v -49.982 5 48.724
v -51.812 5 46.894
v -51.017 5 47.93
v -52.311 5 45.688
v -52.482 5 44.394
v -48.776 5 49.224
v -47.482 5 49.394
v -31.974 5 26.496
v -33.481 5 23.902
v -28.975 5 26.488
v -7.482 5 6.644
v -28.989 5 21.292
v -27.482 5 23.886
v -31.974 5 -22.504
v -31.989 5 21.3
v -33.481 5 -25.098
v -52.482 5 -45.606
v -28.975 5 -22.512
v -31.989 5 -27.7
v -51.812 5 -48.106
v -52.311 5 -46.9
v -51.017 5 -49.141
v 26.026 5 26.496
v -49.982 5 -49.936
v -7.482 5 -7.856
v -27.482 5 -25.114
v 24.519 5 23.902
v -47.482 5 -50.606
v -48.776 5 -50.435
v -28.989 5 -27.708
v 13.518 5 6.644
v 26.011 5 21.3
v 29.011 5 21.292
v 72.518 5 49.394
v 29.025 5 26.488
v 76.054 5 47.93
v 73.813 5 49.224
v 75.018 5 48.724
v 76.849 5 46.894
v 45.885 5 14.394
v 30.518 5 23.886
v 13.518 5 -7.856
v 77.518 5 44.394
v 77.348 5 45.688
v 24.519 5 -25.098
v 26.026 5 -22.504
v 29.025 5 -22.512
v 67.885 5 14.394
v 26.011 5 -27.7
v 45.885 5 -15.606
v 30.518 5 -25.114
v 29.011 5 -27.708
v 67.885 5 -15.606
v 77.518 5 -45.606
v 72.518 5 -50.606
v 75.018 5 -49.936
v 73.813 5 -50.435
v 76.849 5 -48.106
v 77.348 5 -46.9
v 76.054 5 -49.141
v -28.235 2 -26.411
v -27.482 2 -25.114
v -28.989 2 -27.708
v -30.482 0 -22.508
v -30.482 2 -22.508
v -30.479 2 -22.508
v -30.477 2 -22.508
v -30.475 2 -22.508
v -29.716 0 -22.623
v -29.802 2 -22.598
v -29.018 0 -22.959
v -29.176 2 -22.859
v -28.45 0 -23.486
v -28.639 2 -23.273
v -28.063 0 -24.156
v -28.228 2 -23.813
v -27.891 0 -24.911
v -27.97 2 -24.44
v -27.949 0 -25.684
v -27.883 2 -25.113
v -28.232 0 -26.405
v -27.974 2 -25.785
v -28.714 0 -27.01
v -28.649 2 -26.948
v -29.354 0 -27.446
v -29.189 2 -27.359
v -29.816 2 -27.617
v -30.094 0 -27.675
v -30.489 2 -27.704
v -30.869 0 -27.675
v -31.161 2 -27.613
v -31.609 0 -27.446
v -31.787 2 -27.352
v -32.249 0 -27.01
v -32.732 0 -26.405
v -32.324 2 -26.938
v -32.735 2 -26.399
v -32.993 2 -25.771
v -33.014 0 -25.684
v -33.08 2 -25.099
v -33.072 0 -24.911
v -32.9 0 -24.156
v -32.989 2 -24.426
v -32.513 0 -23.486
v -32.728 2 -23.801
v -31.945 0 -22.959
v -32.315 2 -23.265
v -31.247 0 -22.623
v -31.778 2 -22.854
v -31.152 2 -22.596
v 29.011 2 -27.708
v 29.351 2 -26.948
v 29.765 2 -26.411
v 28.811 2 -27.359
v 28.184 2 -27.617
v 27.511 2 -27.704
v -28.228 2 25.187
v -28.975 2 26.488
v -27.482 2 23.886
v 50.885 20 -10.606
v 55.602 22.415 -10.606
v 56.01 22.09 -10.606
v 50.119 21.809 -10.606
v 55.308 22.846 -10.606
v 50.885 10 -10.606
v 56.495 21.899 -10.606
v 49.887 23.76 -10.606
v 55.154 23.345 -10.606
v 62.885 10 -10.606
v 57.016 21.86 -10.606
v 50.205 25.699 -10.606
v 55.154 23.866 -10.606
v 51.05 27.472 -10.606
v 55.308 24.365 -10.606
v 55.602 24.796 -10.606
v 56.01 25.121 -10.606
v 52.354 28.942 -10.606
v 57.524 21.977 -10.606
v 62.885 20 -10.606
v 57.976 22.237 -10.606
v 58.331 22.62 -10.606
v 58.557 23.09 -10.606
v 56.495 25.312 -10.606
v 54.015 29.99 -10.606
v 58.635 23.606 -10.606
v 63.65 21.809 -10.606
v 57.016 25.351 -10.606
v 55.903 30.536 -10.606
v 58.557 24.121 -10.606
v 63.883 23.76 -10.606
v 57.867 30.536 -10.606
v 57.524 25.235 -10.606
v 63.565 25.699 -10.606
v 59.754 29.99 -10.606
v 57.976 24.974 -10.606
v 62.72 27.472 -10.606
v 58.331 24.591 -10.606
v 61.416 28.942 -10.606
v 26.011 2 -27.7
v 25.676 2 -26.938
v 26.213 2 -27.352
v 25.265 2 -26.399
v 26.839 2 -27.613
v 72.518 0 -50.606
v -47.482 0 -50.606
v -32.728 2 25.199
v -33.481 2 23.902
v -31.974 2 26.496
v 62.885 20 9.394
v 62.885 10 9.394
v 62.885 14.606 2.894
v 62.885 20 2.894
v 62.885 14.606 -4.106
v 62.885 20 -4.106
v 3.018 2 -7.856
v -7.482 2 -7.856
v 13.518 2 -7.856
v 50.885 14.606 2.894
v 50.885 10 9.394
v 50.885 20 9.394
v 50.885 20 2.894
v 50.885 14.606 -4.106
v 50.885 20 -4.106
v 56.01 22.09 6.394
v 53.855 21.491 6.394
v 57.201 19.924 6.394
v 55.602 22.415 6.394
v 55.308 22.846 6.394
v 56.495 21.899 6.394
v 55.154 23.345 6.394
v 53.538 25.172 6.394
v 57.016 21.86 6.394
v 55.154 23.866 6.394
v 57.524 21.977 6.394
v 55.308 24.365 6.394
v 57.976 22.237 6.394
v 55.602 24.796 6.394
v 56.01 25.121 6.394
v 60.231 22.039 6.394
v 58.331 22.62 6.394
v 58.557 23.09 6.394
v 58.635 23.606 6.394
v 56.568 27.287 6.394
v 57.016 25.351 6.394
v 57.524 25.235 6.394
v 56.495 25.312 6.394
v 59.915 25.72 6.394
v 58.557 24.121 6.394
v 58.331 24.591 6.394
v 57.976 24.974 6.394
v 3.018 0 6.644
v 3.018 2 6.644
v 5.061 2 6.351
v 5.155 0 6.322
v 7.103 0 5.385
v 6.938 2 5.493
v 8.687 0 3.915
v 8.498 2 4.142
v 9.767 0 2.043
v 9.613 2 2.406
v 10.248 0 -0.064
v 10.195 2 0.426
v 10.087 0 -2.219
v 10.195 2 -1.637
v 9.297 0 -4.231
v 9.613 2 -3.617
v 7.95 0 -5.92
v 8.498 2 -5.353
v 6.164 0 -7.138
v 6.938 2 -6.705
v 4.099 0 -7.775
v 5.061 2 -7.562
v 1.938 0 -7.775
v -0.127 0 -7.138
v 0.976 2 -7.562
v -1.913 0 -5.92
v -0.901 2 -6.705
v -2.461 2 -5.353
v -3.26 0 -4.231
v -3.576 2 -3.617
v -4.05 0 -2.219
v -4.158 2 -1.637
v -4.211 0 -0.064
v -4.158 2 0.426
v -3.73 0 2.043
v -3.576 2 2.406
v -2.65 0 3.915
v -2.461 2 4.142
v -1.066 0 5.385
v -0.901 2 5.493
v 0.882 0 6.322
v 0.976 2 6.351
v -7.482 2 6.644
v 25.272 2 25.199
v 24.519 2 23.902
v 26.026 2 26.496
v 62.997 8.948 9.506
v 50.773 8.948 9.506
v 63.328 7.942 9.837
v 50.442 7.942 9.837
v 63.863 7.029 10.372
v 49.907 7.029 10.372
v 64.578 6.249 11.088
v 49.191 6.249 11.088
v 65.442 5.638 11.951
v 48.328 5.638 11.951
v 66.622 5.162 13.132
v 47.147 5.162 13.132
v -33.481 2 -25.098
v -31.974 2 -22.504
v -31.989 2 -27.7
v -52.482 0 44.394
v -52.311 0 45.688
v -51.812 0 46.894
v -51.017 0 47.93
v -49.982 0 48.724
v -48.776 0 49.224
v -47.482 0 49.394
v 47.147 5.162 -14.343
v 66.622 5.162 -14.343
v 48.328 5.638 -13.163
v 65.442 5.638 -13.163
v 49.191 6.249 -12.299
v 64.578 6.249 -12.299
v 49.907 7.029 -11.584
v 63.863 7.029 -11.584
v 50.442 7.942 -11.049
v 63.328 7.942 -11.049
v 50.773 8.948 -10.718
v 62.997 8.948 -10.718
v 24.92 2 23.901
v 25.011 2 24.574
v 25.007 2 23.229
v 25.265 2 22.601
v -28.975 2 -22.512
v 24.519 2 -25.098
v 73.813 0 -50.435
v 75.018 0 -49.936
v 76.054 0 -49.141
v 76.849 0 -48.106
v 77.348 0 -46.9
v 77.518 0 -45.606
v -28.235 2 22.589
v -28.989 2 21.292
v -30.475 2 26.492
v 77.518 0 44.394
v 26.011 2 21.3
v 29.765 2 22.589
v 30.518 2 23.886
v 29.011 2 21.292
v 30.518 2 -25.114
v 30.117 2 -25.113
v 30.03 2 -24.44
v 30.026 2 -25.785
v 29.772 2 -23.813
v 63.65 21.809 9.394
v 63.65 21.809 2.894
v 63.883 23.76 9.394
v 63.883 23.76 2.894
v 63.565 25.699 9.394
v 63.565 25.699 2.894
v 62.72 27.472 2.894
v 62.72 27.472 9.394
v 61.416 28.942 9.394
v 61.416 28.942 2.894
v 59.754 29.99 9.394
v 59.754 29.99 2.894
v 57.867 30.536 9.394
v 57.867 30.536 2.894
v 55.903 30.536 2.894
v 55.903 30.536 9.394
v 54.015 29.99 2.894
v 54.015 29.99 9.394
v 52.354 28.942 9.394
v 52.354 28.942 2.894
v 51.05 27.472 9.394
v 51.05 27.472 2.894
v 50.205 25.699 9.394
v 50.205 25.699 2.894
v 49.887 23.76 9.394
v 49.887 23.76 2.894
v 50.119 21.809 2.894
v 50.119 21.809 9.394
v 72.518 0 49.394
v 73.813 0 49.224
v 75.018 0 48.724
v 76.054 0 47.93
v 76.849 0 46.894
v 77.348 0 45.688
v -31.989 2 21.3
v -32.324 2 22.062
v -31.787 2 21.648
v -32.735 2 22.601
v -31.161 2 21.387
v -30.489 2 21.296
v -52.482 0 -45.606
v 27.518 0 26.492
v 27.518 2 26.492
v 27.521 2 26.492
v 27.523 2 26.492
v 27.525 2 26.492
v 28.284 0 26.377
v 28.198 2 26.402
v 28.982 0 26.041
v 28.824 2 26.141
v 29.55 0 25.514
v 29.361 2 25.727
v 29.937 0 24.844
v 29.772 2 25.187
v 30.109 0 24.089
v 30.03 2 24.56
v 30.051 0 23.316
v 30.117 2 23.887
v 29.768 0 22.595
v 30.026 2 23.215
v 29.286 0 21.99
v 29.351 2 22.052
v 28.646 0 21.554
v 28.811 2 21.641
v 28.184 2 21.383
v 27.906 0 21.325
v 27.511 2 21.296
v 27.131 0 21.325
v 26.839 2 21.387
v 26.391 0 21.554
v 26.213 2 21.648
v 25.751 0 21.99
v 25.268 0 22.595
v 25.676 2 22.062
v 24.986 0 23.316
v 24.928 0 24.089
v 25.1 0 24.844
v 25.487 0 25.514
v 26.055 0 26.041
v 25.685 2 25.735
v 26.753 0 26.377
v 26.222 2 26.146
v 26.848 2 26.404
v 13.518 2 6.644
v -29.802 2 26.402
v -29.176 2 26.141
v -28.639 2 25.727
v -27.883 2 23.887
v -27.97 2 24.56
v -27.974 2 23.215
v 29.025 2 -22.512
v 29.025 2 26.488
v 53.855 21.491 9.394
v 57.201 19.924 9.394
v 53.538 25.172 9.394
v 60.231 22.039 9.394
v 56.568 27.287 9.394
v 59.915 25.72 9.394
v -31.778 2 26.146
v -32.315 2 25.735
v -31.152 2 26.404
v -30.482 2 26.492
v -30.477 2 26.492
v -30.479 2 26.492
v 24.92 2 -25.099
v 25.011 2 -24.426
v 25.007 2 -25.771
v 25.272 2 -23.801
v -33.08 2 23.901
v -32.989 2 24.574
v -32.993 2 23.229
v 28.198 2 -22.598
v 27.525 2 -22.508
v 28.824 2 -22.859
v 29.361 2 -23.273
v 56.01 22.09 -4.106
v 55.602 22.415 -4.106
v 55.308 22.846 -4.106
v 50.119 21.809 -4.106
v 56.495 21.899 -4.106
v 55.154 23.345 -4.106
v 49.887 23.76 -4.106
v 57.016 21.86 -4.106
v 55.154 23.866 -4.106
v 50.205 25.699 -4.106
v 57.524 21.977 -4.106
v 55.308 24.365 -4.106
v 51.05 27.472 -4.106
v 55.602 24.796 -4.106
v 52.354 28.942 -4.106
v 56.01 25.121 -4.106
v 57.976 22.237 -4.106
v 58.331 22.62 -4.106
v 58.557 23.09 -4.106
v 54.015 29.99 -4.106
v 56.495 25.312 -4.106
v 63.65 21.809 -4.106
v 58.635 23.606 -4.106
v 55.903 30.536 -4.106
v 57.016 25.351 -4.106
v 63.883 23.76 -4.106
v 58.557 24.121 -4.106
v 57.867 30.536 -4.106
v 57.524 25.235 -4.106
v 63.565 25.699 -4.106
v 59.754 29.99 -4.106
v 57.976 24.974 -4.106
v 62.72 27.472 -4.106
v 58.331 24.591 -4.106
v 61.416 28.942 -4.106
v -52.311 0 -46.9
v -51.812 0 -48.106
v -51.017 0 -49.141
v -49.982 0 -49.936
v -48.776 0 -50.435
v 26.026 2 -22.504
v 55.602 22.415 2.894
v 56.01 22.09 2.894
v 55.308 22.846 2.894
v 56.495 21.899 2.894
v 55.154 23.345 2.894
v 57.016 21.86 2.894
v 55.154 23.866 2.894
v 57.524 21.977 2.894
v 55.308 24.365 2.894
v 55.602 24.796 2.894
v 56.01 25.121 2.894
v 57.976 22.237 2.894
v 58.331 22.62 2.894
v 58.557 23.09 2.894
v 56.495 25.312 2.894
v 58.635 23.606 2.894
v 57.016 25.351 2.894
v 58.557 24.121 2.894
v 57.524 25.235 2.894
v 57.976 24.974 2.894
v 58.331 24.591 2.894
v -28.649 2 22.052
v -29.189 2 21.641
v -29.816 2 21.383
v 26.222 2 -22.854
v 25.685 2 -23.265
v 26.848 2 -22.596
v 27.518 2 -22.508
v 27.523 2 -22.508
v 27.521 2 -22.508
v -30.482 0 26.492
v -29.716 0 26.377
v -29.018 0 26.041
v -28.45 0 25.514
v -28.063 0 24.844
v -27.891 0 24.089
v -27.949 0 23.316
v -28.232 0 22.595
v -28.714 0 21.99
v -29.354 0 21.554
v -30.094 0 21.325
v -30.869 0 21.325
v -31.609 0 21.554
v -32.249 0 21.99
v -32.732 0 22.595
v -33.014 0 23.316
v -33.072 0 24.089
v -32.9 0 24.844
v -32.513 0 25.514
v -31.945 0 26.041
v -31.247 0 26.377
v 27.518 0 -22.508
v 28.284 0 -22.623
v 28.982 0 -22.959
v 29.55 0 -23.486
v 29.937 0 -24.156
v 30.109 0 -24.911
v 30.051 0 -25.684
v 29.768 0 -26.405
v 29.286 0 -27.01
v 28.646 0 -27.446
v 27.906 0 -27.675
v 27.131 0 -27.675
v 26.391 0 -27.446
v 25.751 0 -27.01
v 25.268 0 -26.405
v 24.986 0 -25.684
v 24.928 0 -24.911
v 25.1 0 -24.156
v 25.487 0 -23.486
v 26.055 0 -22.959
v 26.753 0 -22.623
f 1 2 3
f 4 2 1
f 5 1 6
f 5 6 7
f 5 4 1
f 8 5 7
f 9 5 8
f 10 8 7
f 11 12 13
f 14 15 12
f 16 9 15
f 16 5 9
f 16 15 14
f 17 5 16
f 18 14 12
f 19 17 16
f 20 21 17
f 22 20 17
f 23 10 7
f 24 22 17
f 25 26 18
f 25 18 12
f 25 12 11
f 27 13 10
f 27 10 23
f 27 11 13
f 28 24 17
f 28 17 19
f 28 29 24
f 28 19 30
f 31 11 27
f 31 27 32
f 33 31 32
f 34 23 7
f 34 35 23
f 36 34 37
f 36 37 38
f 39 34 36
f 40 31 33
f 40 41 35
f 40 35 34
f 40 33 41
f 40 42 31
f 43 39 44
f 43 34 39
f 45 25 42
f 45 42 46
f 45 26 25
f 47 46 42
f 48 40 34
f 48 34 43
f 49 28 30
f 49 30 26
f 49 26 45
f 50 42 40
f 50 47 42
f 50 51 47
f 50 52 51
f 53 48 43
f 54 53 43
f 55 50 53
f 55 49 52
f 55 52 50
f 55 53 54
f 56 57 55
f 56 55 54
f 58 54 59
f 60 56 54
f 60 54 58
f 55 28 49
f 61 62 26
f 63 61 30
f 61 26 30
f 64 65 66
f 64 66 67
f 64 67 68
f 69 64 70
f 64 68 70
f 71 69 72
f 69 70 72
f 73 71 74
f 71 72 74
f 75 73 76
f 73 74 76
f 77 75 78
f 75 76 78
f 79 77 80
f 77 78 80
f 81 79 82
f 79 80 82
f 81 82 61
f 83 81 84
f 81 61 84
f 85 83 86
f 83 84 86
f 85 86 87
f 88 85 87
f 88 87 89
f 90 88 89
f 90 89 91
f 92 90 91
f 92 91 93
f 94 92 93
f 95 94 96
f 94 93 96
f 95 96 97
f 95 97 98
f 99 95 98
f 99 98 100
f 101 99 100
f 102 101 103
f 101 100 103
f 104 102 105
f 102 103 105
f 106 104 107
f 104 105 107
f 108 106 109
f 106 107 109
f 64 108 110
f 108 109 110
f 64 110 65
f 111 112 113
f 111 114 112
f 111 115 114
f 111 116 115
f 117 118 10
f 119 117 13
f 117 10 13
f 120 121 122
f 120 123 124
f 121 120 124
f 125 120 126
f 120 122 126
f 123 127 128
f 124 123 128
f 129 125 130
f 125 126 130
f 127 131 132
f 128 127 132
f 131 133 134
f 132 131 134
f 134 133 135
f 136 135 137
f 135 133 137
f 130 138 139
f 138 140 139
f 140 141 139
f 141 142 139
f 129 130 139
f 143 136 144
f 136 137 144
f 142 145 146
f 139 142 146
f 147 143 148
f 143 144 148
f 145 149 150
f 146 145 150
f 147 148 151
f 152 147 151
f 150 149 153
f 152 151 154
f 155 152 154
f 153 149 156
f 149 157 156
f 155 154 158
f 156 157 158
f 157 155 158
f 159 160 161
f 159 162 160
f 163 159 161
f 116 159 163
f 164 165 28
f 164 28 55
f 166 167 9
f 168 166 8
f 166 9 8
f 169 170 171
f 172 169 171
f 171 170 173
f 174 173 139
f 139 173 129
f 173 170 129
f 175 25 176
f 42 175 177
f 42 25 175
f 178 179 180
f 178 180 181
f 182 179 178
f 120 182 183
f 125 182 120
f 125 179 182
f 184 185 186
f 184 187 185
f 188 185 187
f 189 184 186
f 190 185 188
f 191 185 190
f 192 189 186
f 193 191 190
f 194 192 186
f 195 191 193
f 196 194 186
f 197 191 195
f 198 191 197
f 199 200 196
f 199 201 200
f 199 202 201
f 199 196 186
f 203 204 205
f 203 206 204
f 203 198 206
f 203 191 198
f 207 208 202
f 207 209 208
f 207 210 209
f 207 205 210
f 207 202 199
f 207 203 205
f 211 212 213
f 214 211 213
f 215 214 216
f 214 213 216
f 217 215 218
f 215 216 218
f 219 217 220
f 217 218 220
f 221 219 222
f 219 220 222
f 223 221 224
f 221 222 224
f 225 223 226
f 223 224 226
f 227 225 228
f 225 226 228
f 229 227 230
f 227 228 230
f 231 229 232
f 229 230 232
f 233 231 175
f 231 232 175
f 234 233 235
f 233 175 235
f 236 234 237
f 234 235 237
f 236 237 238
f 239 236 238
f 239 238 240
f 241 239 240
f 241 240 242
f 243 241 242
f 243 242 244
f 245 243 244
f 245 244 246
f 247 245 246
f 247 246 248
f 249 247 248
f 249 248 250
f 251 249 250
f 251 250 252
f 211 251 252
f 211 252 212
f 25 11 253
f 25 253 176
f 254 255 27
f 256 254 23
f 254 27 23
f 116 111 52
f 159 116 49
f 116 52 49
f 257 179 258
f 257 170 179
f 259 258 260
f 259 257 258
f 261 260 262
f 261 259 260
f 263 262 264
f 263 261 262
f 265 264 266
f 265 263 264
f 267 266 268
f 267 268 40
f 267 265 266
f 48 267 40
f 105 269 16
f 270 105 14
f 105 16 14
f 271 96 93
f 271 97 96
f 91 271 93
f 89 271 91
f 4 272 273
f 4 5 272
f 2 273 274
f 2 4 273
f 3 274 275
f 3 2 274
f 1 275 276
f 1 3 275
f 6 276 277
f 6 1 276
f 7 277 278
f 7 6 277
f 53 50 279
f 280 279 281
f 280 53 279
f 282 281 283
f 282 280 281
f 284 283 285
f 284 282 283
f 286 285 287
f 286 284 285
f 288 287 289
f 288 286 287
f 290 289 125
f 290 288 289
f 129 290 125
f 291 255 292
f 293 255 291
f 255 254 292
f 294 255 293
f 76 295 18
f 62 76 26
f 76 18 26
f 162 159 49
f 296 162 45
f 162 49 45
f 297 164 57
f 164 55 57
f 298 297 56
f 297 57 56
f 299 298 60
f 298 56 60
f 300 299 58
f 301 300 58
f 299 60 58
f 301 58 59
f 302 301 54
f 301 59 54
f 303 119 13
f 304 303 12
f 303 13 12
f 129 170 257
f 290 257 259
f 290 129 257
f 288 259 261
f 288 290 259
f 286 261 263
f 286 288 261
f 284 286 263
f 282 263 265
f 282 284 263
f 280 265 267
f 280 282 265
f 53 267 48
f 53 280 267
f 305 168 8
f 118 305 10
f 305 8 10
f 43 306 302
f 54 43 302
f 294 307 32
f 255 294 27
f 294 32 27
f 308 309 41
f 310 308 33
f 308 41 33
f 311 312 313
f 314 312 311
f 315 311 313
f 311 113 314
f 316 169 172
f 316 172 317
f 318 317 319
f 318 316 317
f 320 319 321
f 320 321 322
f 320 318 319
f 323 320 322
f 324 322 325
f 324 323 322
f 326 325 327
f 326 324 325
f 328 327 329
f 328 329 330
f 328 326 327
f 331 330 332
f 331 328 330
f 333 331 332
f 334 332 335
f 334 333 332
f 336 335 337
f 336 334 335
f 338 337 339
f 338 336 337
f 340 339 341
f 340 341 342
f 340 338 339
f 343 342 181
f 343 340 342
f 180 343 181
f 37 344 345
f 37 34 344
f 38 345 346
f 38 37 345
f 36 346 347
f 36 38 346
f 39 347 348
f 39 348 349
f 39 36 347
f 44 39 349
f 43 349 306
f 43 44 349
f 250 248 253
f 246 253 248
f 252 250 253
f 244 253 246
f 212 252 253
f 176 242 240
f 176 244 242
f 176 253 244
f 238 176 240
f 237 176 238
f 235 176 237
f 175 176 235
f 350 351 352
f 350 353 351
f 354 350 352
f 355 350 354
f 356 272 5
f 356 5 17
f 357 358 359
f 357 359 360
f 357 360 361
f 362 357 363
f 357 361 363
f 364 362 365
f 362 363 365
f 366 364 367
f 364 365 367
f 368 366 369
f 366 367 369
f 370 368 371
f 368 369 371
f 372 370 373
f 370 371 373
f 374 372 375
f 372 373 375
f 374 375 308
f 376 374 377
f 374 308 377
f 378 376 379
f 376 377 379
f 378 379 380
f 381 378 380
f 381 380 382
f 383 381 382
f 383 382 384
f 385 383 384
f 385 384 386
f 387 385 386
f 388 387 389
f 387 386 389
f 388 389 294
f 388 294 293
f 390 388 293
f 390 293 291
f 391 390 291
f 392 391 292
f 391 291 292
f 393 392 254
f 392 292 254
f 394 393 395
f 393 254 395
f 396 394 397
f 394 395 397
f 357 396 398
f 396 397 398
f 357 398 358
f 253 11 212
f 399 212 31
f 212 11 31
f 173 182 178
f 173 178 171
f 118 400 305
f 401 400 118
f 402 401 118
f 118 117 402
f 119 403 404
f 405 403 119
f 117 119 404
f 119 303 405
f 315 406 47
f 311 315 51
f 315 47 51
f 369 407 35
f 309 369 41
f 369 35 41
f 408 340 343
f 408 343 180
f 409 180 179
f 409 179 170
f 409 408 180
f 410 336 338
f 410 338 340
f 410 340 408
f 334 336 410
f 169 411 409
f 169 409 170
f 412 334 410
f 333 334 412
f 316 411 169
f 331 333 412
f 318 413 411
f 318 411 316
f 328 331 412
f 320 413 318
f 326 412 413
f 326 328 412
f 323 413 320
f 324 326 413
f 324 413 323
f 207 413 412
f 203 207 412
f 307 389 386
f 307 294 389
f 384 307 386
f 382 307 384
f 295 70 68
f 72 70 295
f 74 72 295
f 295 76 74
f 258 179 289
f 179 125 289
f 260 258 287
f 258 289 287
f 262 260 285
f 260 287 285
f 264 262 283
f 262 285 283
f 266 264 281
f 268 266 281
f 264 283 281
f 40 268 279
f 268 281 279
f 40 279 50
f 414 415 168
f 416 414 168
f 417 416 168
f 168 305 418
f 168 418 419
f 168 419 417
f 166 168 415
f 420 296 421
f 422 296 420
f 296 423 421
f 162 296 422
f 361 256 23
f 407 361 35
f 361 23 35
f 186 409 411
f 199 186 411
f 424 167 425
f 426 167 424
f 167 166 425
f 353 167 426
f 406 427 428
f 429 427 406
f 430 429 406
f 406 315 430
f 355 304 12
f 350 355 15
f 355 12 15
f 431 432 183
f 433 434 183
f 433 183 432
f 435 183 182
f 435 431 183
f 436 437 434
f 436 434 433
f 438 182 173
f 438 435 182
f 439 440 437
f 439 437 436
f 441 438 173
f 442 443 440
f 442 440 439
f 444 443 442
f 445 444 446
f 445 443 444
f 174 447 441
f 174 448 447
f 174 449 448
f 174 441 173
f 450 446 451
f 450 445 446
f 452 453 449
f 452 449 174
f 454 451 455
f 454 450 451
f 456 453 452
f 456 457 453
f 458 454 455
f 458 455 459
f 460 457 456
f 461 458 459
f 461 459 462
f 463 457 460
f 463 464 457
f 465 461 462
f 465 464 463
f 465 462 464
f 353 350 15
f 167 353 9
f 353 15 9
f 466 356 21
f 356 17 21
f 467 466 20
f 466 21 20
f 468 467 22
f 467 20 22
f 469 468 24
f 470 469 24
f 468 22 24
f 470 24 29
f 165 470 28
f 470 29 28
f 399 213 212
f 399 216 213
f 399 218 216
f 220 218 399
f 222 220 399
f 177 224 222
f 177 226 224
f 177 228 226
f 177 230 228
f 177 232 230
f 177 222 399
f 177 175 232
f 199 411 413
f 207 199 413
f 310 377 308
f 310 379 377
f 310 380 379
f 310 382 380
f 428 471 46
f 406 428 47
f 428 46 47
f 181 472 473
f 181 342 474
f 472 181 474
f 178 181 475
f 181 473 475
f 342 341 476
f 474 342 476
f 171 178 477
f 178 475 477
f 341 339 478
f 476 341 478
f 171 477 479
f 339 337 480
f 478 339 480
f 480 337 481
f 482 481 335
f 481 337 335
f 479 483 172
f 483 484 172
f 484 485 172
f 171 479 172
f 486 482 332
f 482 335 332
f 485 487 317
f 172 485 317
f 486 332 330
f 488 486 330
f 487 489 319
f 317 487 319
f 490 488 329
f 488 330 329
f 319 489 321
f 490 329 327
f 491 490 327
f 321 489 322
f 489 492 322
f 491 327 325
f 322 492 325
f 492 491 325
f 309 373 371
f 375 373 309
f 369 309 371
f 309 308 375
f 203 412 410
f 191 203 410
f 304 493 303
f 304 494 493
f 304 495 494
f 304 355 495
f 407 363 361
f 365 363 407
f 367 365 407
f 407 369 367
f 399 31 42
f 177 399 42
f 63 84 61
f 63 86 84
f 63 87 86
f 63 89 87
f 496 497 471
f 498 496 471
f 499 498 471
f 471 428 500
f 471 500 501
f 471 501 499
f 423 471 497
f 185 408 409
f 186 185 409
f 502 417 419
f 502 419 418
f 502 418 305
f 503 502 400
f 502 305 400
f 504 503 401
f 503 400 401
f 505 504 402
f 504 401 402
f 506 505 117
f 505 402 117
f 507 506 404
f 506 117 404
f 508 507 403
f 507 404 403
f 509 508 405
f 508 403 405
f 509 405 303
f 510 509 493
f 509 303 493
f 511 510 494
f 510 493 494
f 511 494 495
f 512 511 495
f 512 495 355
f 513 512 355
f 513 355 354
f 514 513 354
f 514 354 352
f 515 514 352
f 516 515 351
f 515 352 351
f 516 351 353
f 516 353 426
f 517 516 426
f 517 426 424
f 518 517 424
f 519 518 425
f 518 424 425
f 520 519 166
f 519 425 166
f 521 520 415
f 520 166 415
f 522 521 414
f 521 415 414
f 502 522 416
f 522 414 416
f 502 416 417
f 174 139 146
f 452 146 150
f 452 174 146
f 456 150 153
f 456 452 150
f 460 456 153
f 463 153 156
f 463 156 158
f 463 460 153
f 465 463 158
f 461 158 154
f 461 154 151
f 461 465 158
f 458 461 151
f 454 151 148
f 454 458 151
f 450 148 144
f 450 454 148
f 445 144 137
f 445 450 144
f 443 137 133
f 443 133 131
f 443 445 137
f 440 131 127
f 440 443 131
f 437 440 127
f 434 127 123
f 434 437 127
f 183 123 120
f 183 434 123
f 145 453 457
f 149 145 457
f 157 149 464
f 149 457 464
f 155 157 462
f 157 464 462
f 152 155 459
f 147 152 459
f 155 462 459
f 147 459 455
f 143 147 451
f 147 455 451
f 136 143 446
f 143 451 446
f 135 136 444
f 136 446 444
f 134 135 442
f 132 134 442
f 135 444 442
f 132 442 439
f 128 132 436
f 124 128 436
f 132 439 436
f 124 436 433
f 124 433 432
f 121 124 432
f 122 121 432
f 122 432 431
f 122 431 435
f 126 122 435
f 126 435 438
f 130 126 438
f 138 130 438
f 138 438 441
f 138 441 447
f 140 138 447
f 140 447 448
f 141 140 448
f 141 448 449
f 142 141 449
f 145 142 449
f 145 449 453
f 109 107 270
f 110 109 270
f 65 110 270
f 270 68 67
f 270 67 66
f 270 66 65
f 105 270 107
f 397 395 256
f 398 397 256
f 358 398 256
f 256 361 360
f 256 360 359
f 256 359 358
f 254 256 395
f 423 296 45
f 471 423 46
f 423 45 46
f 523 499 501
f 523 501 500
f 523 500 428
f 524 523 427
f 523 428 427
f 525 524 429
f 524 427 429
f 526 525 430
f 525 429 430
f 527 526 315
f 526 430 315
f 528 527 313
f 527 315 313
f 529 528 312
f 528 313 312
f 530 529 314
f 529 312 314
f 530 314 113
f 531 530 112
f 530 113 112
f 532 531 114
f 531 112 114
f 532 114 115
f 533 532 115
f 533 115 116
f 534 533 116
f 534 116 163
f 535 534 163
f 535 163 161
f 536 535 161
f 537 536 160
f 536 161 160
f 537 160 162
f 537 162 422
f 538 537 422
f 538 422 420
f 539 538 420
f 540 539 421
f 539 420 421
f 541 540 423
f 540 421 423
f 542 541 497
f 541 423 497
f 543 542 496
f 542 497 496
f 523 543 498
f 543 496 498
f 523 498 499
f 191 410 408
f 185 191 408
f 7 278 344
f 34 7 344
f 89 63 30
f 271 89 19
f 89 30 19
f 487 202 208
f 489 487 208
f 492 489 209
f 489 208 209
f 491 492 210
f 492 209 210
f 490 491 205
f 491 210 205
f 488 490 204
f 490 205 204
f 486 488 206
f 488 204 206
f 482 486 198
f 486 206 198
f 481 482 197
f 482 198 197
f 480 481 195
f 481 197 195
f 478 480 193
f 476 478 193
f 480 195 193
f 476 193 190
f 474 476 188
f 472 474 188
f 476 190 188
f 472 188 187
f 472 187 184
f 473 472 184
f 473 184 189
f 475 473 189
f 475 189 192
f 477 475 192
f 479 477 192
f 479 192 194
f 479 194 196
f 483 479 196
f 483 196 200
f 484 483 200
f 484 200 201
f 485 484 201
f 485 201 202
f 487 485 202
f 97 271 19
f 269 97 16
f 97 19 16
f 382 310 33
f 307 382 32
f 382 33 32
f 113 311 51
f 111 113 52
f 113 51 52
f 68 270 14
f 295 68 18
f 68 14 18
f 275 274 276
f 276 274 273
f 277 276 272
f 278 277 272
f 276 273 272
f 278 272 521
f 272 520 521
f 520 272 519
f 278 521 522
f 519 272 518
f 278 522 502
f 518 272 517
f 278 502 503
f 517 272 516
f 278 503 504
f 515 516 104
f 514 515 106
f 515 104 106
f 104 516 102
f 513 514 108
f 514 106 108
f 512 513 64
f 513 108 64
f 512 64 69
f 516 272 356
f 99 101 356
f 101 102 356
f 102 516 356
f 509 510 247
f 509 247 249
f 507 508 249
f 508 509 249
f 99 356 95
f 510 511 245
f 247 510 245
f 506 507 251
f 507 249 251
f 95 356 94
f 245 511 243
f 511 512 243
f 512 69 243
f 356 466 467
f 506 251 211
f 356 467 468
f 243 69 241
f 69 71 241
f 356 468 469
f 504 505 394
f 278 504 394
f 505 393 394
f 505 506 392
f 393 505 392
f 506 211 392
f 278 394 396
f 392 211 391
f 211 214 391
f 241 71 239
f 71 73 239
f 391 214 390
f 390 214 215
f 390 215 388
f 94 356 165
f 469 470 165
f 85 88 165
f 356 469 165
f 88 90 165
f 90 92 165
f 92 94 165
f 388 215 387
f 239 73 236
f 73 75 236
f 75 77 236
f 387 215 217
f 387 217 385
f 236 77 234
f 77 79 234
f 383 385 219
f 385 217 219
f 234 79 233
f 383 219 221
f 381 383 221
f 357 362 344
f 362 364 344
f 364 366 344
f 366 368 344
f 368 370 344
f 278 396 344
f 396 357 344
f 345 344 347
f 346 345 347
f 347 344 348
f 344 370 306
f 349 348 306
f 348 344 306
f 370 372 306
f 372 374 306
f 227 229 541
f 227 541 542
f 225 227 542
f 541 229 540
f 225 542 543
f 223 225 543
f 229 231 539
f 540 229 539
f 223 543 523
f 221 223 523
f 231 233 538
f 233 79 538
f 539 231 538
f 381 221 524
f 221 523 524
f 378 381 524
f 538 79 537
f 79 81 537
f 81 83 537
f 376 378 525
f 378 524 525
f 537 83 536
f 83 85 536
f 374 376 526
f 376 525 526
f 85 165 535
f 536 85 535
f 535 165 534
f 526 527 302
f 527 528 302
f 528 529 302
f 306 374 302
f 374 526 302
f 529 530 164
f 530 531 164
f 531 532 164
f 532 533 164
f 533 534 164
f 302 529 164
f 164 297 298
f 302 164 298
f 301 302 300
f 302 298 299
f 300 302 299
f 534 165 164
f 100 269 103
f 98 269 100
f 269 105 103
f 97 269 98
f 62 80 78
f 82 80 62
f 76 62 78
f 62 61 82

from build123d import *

# Parameters (mm, degrees)
ESQUISSE1_W                     = 130
ESQUISSE1_H                     = 100
BOSS_EXTRU_1_DEPTH              = 5
ENL_V_MAT_EXTRU_3_DEPTH         = 3
R_P_TITION_LIN_AIRE1_COUNT      = 2
R_P_TITION_LIN_AIRE1_PITCH      = 58
R_P_TITION_LIN_AIRE1_COUNT_DIR2 = 2
R_P_TITION_LIN_AIRE1_PITCH_DIR2 = 49
ESQUISSE8_R                     = 2.598076211
ENL_V_MAT_EXTRU_4_DEPTH         = 93.709474566
R_P_TITION_LIN_AIRE2_COUNT      = 2
R_P_TITION_LIN_AIRE2_PITCH      = 58
R_P_TITION_LIN_AIRE2_COUNT_DIR2 = 2
R_P_TITION_LIN_AIRE2_PITCH_DIR2 = 49
ESQUISSE9_W                     = 12
ESQUISSE9_H                     = 20
BOSS_EXTRU_2_DEPTH              = 15
BOSS_EXTRU_3_DEPTH              = 20
ESQUISSE14_W                    = 16
ESQUISSE14_H                    = 7
ENL_V_MAT_EXTRU_6_DEPTH         = 16
ENL_V_MAT_EXTRU_7_DEPTH         = 13
ESQUISSE18_R                    = 1.75
ENL_V_MAT_EXTRU_8_DEPTH         = 33
CONG_1_R                        = 5
CONG_2_R                        = 5
ESQUISSE19_W                    = 21
ESQUISSE19_H                    = 14.5
ENL_V_MAT_EXTRU_9_DEPTH         = 3
ESQUISSE20_R                    = 7.25
ENL_V_MAT_EXTRU_10_DEPTH        = 12


with BuildPart() as part:
    # Esquisse1 → Boss.-Extru.1 (new body)
    with BuildSketch(Plane(origin=(0, 0, 0), x_dir=(1, 0, 0), z_dir=(0, 1, 0))):
        with Locations((12.518489284, 0.605636973)):
            Rectangle(ESQUISSE1_W, ESQUISSE1_H)
    extrude(amount=BOSS_EXTRU_1_DEPTH)

    # Esquisse5 → Enlèv. mat.-Extru.3 (cut)
    with BuildSketch(Plane(origin=(0, 5, 0), x_dir=(1, 0, 0), z_dir=(0, 1, 0))):
        Polygon((-28.974508208, 22.511616263), (-27.48152163, 25.113729073), (-28.988524137, 27.707749783), (-31.988513224, 27.699657683), (-33.481499802, 25.097544873), (-31.974497295, 22.503524163), align=None)
    enl_v_mat_extru_3 = extrude(amount=-ENL_V_MAT_EXTRU_3_DEPTH, mode=Mode.SUBTRACT)

    # Répétition linéaire1: Enl_v. mat.-Extru.3 2 × 2
    with Locations(*[(i * R_P_TITION_LIN_AIRE1_PITCH, 0, j * R_P_TITION_LIN_AIRE1_PITCH_DIR2) for i in range(R_P_TITION_LIN_AIRE1_COUNT) for j in range(R_P_TITION_LIN_AIRE1_COUNT_DIR2) if (i, j) != (0, 0)]):
        add(enl_v_mat_extru_3, mode=Mode.SUBTRACT)

    # Esquisse8 → Enlèv. mat.-Extru.4 (cut, through all)
    with BuildSketch(Plane(origin=(0, 5, 0), x_dir=(1, 0, 0), z_dir=(0, 1, 0))):
        with Locations(Location((-30.481510716, 25.105636973, 0), (0, 0, 270))):
            Circle(ESQUISSE8_R)
    enl_v_mat_extru_4 = extrude(amount=-ENL_V_MAT_EXTRU_4_DEPTH, mode=Mode.SUBTRACT)

    # Répétition linéaire2: Enl_v. mat.-Extru.4 2 × 2
    with Locations(*[(i * R_P_TITION_LIN_AIRE2_PITCH, 0, j * R_P_TITION_LIN_AIRE2_PITCH_DIR2) for i in range(R_P_TITION_LIN_AIRE2_COUNT) for j in range(R_P_TITION_LIN_AIRE2_COUNT_DIR2) if (i, j) != (0, 0)]):
        add(enl_v_mat_extru_4, mode=Mode.SUBTRACT)

    # Esquisse9 → Boss.-Extru.2 (add)
    with BuildSketch(Plane(origin=(0, 5, 0), x_dir=(1, 0, 0), z_dir=(0, 1, 0))):
        with Locations((56.884872881, 0.605636973)):
            Rectangle(ESQUISSE9_W, ESQUISSE9_H)
    extrude(amount=BOSS_EXTRU_2_DEPTH)

    # Esquisse10 → Boss.-Extru.3 (add)
    with BuildSketch(Plane.XY.offset(9.394363027)):
        with BuildLine():
            Line((50.884872881, 20), (62.884872881, 20))
            ThreePointArc((62.884872881, 20), (56.884872881, 30.605551275), (50.884872881, 20))
        make_face()
    extrude(amount=-BOSS_EXTRU_3_DEPTH)

    # Esquisse14 → Enlèv. mat.-Extru.6 (cut)
    with BuildSketch(Plane(origin=(0, 30.605551275, 0), x_dir=(1, 0, 0), z_dir=(0, 1, 0))):
        with Locations((57.018489284, 0.605636973)):
            Rectangle(ESQUISSE14_W, ESQUISSE14_H)
    extrude(amount=-ENL_V_MAT_EXTRU_6_DEPTH, mode=Mode.SUBTRACT)

    # Esquisse17 → Enlèv. mat.-Extru.7 (cut)
    with BuildSketch(Plane.XY.offset(19.394363027)):
        Polygon((60.23131756, 22.03882177), (59.914922773, 25.720292627), (56.568478094, 27.287022133), (53.538428202, 25.172280781), (53.854822989, 21.490809924), (57.201267668, 19.924080418), align=None)
    extrude(amount=-ENL_V_MAT_EXTRU_7_DEPTH, mode=Mode.SUBTRACT)

    # Esquisse18 → Enlèv. mat.-Extru.8 (cut)
    with BuildSketch(Plane.XY.offset(19.394363027)):
        with Locations((56.884872881, 23.605551275)):
            Circle(ESQUISSE18_R)
    extrude(amount=-ENL_V_MAT_EXTRU_8_DEPTH, mode=Mode.SUBTRACT)

    # Congé1
    cong_1_edges = [part.edges().sort_by_distance(p)[0] for p in [
        (50.884872881, 5, -0.605636973),
        (56.884872881, 5, 9.394363027),
        (62.884872881, 5, -0.605636973),
        (56.884872881, 5, -10.605636973),
    ]]
    fillet(cong_1_edges, radius=CONG_1_R)

    # Congé2
    cong_2_edges = [part.edges().sort_by_distance(p)[0] for p in [
        (-52.481510716, 2.5, -50.605636973),
        (77.518489284, 2.5, -50.605636973),
        (77.518489284, 2.5, 49.394363027),
        (-52.481510716, 2.5, 49.394363027),
    ]]
    fillet(cong_2_edges, radius=CONG_2_R)

    # Esquisse19 → Enlèv. mat.-Extru.9 (cut)
    with BuildSketch(Plane(origin=(0, 5, 0), x_dir=(1, 0, 0), z_dir=(0, 1, 0))):
        with Locations((3.018489284, 0.605636973)):
            Rectangle(ESQUISSE19_W, ESQUISSE19_H)
    extrude(amount=-ENL_V_MAT_EXTRU_9_DEPTH, mode=Mode.SUBTRACT)

    # Esquisse20 → Enlèv. mat.-Extru.10 (cut)
    with BuildSketch(Plane(origin=(0, 5, 0), x_dir=(1, 0, 0), z_dir=(0, 1, 0))):
        with Locations(Location((3.018489284, 0.605636973, 0), (0, 0, 270))):
            Circle(ESQUISSE20_R)
    extrude(amount=-ENL_V_MAT_EXTRU_10_DEPTH, mode=Mode.SUBTRACT)


solid = part.part
